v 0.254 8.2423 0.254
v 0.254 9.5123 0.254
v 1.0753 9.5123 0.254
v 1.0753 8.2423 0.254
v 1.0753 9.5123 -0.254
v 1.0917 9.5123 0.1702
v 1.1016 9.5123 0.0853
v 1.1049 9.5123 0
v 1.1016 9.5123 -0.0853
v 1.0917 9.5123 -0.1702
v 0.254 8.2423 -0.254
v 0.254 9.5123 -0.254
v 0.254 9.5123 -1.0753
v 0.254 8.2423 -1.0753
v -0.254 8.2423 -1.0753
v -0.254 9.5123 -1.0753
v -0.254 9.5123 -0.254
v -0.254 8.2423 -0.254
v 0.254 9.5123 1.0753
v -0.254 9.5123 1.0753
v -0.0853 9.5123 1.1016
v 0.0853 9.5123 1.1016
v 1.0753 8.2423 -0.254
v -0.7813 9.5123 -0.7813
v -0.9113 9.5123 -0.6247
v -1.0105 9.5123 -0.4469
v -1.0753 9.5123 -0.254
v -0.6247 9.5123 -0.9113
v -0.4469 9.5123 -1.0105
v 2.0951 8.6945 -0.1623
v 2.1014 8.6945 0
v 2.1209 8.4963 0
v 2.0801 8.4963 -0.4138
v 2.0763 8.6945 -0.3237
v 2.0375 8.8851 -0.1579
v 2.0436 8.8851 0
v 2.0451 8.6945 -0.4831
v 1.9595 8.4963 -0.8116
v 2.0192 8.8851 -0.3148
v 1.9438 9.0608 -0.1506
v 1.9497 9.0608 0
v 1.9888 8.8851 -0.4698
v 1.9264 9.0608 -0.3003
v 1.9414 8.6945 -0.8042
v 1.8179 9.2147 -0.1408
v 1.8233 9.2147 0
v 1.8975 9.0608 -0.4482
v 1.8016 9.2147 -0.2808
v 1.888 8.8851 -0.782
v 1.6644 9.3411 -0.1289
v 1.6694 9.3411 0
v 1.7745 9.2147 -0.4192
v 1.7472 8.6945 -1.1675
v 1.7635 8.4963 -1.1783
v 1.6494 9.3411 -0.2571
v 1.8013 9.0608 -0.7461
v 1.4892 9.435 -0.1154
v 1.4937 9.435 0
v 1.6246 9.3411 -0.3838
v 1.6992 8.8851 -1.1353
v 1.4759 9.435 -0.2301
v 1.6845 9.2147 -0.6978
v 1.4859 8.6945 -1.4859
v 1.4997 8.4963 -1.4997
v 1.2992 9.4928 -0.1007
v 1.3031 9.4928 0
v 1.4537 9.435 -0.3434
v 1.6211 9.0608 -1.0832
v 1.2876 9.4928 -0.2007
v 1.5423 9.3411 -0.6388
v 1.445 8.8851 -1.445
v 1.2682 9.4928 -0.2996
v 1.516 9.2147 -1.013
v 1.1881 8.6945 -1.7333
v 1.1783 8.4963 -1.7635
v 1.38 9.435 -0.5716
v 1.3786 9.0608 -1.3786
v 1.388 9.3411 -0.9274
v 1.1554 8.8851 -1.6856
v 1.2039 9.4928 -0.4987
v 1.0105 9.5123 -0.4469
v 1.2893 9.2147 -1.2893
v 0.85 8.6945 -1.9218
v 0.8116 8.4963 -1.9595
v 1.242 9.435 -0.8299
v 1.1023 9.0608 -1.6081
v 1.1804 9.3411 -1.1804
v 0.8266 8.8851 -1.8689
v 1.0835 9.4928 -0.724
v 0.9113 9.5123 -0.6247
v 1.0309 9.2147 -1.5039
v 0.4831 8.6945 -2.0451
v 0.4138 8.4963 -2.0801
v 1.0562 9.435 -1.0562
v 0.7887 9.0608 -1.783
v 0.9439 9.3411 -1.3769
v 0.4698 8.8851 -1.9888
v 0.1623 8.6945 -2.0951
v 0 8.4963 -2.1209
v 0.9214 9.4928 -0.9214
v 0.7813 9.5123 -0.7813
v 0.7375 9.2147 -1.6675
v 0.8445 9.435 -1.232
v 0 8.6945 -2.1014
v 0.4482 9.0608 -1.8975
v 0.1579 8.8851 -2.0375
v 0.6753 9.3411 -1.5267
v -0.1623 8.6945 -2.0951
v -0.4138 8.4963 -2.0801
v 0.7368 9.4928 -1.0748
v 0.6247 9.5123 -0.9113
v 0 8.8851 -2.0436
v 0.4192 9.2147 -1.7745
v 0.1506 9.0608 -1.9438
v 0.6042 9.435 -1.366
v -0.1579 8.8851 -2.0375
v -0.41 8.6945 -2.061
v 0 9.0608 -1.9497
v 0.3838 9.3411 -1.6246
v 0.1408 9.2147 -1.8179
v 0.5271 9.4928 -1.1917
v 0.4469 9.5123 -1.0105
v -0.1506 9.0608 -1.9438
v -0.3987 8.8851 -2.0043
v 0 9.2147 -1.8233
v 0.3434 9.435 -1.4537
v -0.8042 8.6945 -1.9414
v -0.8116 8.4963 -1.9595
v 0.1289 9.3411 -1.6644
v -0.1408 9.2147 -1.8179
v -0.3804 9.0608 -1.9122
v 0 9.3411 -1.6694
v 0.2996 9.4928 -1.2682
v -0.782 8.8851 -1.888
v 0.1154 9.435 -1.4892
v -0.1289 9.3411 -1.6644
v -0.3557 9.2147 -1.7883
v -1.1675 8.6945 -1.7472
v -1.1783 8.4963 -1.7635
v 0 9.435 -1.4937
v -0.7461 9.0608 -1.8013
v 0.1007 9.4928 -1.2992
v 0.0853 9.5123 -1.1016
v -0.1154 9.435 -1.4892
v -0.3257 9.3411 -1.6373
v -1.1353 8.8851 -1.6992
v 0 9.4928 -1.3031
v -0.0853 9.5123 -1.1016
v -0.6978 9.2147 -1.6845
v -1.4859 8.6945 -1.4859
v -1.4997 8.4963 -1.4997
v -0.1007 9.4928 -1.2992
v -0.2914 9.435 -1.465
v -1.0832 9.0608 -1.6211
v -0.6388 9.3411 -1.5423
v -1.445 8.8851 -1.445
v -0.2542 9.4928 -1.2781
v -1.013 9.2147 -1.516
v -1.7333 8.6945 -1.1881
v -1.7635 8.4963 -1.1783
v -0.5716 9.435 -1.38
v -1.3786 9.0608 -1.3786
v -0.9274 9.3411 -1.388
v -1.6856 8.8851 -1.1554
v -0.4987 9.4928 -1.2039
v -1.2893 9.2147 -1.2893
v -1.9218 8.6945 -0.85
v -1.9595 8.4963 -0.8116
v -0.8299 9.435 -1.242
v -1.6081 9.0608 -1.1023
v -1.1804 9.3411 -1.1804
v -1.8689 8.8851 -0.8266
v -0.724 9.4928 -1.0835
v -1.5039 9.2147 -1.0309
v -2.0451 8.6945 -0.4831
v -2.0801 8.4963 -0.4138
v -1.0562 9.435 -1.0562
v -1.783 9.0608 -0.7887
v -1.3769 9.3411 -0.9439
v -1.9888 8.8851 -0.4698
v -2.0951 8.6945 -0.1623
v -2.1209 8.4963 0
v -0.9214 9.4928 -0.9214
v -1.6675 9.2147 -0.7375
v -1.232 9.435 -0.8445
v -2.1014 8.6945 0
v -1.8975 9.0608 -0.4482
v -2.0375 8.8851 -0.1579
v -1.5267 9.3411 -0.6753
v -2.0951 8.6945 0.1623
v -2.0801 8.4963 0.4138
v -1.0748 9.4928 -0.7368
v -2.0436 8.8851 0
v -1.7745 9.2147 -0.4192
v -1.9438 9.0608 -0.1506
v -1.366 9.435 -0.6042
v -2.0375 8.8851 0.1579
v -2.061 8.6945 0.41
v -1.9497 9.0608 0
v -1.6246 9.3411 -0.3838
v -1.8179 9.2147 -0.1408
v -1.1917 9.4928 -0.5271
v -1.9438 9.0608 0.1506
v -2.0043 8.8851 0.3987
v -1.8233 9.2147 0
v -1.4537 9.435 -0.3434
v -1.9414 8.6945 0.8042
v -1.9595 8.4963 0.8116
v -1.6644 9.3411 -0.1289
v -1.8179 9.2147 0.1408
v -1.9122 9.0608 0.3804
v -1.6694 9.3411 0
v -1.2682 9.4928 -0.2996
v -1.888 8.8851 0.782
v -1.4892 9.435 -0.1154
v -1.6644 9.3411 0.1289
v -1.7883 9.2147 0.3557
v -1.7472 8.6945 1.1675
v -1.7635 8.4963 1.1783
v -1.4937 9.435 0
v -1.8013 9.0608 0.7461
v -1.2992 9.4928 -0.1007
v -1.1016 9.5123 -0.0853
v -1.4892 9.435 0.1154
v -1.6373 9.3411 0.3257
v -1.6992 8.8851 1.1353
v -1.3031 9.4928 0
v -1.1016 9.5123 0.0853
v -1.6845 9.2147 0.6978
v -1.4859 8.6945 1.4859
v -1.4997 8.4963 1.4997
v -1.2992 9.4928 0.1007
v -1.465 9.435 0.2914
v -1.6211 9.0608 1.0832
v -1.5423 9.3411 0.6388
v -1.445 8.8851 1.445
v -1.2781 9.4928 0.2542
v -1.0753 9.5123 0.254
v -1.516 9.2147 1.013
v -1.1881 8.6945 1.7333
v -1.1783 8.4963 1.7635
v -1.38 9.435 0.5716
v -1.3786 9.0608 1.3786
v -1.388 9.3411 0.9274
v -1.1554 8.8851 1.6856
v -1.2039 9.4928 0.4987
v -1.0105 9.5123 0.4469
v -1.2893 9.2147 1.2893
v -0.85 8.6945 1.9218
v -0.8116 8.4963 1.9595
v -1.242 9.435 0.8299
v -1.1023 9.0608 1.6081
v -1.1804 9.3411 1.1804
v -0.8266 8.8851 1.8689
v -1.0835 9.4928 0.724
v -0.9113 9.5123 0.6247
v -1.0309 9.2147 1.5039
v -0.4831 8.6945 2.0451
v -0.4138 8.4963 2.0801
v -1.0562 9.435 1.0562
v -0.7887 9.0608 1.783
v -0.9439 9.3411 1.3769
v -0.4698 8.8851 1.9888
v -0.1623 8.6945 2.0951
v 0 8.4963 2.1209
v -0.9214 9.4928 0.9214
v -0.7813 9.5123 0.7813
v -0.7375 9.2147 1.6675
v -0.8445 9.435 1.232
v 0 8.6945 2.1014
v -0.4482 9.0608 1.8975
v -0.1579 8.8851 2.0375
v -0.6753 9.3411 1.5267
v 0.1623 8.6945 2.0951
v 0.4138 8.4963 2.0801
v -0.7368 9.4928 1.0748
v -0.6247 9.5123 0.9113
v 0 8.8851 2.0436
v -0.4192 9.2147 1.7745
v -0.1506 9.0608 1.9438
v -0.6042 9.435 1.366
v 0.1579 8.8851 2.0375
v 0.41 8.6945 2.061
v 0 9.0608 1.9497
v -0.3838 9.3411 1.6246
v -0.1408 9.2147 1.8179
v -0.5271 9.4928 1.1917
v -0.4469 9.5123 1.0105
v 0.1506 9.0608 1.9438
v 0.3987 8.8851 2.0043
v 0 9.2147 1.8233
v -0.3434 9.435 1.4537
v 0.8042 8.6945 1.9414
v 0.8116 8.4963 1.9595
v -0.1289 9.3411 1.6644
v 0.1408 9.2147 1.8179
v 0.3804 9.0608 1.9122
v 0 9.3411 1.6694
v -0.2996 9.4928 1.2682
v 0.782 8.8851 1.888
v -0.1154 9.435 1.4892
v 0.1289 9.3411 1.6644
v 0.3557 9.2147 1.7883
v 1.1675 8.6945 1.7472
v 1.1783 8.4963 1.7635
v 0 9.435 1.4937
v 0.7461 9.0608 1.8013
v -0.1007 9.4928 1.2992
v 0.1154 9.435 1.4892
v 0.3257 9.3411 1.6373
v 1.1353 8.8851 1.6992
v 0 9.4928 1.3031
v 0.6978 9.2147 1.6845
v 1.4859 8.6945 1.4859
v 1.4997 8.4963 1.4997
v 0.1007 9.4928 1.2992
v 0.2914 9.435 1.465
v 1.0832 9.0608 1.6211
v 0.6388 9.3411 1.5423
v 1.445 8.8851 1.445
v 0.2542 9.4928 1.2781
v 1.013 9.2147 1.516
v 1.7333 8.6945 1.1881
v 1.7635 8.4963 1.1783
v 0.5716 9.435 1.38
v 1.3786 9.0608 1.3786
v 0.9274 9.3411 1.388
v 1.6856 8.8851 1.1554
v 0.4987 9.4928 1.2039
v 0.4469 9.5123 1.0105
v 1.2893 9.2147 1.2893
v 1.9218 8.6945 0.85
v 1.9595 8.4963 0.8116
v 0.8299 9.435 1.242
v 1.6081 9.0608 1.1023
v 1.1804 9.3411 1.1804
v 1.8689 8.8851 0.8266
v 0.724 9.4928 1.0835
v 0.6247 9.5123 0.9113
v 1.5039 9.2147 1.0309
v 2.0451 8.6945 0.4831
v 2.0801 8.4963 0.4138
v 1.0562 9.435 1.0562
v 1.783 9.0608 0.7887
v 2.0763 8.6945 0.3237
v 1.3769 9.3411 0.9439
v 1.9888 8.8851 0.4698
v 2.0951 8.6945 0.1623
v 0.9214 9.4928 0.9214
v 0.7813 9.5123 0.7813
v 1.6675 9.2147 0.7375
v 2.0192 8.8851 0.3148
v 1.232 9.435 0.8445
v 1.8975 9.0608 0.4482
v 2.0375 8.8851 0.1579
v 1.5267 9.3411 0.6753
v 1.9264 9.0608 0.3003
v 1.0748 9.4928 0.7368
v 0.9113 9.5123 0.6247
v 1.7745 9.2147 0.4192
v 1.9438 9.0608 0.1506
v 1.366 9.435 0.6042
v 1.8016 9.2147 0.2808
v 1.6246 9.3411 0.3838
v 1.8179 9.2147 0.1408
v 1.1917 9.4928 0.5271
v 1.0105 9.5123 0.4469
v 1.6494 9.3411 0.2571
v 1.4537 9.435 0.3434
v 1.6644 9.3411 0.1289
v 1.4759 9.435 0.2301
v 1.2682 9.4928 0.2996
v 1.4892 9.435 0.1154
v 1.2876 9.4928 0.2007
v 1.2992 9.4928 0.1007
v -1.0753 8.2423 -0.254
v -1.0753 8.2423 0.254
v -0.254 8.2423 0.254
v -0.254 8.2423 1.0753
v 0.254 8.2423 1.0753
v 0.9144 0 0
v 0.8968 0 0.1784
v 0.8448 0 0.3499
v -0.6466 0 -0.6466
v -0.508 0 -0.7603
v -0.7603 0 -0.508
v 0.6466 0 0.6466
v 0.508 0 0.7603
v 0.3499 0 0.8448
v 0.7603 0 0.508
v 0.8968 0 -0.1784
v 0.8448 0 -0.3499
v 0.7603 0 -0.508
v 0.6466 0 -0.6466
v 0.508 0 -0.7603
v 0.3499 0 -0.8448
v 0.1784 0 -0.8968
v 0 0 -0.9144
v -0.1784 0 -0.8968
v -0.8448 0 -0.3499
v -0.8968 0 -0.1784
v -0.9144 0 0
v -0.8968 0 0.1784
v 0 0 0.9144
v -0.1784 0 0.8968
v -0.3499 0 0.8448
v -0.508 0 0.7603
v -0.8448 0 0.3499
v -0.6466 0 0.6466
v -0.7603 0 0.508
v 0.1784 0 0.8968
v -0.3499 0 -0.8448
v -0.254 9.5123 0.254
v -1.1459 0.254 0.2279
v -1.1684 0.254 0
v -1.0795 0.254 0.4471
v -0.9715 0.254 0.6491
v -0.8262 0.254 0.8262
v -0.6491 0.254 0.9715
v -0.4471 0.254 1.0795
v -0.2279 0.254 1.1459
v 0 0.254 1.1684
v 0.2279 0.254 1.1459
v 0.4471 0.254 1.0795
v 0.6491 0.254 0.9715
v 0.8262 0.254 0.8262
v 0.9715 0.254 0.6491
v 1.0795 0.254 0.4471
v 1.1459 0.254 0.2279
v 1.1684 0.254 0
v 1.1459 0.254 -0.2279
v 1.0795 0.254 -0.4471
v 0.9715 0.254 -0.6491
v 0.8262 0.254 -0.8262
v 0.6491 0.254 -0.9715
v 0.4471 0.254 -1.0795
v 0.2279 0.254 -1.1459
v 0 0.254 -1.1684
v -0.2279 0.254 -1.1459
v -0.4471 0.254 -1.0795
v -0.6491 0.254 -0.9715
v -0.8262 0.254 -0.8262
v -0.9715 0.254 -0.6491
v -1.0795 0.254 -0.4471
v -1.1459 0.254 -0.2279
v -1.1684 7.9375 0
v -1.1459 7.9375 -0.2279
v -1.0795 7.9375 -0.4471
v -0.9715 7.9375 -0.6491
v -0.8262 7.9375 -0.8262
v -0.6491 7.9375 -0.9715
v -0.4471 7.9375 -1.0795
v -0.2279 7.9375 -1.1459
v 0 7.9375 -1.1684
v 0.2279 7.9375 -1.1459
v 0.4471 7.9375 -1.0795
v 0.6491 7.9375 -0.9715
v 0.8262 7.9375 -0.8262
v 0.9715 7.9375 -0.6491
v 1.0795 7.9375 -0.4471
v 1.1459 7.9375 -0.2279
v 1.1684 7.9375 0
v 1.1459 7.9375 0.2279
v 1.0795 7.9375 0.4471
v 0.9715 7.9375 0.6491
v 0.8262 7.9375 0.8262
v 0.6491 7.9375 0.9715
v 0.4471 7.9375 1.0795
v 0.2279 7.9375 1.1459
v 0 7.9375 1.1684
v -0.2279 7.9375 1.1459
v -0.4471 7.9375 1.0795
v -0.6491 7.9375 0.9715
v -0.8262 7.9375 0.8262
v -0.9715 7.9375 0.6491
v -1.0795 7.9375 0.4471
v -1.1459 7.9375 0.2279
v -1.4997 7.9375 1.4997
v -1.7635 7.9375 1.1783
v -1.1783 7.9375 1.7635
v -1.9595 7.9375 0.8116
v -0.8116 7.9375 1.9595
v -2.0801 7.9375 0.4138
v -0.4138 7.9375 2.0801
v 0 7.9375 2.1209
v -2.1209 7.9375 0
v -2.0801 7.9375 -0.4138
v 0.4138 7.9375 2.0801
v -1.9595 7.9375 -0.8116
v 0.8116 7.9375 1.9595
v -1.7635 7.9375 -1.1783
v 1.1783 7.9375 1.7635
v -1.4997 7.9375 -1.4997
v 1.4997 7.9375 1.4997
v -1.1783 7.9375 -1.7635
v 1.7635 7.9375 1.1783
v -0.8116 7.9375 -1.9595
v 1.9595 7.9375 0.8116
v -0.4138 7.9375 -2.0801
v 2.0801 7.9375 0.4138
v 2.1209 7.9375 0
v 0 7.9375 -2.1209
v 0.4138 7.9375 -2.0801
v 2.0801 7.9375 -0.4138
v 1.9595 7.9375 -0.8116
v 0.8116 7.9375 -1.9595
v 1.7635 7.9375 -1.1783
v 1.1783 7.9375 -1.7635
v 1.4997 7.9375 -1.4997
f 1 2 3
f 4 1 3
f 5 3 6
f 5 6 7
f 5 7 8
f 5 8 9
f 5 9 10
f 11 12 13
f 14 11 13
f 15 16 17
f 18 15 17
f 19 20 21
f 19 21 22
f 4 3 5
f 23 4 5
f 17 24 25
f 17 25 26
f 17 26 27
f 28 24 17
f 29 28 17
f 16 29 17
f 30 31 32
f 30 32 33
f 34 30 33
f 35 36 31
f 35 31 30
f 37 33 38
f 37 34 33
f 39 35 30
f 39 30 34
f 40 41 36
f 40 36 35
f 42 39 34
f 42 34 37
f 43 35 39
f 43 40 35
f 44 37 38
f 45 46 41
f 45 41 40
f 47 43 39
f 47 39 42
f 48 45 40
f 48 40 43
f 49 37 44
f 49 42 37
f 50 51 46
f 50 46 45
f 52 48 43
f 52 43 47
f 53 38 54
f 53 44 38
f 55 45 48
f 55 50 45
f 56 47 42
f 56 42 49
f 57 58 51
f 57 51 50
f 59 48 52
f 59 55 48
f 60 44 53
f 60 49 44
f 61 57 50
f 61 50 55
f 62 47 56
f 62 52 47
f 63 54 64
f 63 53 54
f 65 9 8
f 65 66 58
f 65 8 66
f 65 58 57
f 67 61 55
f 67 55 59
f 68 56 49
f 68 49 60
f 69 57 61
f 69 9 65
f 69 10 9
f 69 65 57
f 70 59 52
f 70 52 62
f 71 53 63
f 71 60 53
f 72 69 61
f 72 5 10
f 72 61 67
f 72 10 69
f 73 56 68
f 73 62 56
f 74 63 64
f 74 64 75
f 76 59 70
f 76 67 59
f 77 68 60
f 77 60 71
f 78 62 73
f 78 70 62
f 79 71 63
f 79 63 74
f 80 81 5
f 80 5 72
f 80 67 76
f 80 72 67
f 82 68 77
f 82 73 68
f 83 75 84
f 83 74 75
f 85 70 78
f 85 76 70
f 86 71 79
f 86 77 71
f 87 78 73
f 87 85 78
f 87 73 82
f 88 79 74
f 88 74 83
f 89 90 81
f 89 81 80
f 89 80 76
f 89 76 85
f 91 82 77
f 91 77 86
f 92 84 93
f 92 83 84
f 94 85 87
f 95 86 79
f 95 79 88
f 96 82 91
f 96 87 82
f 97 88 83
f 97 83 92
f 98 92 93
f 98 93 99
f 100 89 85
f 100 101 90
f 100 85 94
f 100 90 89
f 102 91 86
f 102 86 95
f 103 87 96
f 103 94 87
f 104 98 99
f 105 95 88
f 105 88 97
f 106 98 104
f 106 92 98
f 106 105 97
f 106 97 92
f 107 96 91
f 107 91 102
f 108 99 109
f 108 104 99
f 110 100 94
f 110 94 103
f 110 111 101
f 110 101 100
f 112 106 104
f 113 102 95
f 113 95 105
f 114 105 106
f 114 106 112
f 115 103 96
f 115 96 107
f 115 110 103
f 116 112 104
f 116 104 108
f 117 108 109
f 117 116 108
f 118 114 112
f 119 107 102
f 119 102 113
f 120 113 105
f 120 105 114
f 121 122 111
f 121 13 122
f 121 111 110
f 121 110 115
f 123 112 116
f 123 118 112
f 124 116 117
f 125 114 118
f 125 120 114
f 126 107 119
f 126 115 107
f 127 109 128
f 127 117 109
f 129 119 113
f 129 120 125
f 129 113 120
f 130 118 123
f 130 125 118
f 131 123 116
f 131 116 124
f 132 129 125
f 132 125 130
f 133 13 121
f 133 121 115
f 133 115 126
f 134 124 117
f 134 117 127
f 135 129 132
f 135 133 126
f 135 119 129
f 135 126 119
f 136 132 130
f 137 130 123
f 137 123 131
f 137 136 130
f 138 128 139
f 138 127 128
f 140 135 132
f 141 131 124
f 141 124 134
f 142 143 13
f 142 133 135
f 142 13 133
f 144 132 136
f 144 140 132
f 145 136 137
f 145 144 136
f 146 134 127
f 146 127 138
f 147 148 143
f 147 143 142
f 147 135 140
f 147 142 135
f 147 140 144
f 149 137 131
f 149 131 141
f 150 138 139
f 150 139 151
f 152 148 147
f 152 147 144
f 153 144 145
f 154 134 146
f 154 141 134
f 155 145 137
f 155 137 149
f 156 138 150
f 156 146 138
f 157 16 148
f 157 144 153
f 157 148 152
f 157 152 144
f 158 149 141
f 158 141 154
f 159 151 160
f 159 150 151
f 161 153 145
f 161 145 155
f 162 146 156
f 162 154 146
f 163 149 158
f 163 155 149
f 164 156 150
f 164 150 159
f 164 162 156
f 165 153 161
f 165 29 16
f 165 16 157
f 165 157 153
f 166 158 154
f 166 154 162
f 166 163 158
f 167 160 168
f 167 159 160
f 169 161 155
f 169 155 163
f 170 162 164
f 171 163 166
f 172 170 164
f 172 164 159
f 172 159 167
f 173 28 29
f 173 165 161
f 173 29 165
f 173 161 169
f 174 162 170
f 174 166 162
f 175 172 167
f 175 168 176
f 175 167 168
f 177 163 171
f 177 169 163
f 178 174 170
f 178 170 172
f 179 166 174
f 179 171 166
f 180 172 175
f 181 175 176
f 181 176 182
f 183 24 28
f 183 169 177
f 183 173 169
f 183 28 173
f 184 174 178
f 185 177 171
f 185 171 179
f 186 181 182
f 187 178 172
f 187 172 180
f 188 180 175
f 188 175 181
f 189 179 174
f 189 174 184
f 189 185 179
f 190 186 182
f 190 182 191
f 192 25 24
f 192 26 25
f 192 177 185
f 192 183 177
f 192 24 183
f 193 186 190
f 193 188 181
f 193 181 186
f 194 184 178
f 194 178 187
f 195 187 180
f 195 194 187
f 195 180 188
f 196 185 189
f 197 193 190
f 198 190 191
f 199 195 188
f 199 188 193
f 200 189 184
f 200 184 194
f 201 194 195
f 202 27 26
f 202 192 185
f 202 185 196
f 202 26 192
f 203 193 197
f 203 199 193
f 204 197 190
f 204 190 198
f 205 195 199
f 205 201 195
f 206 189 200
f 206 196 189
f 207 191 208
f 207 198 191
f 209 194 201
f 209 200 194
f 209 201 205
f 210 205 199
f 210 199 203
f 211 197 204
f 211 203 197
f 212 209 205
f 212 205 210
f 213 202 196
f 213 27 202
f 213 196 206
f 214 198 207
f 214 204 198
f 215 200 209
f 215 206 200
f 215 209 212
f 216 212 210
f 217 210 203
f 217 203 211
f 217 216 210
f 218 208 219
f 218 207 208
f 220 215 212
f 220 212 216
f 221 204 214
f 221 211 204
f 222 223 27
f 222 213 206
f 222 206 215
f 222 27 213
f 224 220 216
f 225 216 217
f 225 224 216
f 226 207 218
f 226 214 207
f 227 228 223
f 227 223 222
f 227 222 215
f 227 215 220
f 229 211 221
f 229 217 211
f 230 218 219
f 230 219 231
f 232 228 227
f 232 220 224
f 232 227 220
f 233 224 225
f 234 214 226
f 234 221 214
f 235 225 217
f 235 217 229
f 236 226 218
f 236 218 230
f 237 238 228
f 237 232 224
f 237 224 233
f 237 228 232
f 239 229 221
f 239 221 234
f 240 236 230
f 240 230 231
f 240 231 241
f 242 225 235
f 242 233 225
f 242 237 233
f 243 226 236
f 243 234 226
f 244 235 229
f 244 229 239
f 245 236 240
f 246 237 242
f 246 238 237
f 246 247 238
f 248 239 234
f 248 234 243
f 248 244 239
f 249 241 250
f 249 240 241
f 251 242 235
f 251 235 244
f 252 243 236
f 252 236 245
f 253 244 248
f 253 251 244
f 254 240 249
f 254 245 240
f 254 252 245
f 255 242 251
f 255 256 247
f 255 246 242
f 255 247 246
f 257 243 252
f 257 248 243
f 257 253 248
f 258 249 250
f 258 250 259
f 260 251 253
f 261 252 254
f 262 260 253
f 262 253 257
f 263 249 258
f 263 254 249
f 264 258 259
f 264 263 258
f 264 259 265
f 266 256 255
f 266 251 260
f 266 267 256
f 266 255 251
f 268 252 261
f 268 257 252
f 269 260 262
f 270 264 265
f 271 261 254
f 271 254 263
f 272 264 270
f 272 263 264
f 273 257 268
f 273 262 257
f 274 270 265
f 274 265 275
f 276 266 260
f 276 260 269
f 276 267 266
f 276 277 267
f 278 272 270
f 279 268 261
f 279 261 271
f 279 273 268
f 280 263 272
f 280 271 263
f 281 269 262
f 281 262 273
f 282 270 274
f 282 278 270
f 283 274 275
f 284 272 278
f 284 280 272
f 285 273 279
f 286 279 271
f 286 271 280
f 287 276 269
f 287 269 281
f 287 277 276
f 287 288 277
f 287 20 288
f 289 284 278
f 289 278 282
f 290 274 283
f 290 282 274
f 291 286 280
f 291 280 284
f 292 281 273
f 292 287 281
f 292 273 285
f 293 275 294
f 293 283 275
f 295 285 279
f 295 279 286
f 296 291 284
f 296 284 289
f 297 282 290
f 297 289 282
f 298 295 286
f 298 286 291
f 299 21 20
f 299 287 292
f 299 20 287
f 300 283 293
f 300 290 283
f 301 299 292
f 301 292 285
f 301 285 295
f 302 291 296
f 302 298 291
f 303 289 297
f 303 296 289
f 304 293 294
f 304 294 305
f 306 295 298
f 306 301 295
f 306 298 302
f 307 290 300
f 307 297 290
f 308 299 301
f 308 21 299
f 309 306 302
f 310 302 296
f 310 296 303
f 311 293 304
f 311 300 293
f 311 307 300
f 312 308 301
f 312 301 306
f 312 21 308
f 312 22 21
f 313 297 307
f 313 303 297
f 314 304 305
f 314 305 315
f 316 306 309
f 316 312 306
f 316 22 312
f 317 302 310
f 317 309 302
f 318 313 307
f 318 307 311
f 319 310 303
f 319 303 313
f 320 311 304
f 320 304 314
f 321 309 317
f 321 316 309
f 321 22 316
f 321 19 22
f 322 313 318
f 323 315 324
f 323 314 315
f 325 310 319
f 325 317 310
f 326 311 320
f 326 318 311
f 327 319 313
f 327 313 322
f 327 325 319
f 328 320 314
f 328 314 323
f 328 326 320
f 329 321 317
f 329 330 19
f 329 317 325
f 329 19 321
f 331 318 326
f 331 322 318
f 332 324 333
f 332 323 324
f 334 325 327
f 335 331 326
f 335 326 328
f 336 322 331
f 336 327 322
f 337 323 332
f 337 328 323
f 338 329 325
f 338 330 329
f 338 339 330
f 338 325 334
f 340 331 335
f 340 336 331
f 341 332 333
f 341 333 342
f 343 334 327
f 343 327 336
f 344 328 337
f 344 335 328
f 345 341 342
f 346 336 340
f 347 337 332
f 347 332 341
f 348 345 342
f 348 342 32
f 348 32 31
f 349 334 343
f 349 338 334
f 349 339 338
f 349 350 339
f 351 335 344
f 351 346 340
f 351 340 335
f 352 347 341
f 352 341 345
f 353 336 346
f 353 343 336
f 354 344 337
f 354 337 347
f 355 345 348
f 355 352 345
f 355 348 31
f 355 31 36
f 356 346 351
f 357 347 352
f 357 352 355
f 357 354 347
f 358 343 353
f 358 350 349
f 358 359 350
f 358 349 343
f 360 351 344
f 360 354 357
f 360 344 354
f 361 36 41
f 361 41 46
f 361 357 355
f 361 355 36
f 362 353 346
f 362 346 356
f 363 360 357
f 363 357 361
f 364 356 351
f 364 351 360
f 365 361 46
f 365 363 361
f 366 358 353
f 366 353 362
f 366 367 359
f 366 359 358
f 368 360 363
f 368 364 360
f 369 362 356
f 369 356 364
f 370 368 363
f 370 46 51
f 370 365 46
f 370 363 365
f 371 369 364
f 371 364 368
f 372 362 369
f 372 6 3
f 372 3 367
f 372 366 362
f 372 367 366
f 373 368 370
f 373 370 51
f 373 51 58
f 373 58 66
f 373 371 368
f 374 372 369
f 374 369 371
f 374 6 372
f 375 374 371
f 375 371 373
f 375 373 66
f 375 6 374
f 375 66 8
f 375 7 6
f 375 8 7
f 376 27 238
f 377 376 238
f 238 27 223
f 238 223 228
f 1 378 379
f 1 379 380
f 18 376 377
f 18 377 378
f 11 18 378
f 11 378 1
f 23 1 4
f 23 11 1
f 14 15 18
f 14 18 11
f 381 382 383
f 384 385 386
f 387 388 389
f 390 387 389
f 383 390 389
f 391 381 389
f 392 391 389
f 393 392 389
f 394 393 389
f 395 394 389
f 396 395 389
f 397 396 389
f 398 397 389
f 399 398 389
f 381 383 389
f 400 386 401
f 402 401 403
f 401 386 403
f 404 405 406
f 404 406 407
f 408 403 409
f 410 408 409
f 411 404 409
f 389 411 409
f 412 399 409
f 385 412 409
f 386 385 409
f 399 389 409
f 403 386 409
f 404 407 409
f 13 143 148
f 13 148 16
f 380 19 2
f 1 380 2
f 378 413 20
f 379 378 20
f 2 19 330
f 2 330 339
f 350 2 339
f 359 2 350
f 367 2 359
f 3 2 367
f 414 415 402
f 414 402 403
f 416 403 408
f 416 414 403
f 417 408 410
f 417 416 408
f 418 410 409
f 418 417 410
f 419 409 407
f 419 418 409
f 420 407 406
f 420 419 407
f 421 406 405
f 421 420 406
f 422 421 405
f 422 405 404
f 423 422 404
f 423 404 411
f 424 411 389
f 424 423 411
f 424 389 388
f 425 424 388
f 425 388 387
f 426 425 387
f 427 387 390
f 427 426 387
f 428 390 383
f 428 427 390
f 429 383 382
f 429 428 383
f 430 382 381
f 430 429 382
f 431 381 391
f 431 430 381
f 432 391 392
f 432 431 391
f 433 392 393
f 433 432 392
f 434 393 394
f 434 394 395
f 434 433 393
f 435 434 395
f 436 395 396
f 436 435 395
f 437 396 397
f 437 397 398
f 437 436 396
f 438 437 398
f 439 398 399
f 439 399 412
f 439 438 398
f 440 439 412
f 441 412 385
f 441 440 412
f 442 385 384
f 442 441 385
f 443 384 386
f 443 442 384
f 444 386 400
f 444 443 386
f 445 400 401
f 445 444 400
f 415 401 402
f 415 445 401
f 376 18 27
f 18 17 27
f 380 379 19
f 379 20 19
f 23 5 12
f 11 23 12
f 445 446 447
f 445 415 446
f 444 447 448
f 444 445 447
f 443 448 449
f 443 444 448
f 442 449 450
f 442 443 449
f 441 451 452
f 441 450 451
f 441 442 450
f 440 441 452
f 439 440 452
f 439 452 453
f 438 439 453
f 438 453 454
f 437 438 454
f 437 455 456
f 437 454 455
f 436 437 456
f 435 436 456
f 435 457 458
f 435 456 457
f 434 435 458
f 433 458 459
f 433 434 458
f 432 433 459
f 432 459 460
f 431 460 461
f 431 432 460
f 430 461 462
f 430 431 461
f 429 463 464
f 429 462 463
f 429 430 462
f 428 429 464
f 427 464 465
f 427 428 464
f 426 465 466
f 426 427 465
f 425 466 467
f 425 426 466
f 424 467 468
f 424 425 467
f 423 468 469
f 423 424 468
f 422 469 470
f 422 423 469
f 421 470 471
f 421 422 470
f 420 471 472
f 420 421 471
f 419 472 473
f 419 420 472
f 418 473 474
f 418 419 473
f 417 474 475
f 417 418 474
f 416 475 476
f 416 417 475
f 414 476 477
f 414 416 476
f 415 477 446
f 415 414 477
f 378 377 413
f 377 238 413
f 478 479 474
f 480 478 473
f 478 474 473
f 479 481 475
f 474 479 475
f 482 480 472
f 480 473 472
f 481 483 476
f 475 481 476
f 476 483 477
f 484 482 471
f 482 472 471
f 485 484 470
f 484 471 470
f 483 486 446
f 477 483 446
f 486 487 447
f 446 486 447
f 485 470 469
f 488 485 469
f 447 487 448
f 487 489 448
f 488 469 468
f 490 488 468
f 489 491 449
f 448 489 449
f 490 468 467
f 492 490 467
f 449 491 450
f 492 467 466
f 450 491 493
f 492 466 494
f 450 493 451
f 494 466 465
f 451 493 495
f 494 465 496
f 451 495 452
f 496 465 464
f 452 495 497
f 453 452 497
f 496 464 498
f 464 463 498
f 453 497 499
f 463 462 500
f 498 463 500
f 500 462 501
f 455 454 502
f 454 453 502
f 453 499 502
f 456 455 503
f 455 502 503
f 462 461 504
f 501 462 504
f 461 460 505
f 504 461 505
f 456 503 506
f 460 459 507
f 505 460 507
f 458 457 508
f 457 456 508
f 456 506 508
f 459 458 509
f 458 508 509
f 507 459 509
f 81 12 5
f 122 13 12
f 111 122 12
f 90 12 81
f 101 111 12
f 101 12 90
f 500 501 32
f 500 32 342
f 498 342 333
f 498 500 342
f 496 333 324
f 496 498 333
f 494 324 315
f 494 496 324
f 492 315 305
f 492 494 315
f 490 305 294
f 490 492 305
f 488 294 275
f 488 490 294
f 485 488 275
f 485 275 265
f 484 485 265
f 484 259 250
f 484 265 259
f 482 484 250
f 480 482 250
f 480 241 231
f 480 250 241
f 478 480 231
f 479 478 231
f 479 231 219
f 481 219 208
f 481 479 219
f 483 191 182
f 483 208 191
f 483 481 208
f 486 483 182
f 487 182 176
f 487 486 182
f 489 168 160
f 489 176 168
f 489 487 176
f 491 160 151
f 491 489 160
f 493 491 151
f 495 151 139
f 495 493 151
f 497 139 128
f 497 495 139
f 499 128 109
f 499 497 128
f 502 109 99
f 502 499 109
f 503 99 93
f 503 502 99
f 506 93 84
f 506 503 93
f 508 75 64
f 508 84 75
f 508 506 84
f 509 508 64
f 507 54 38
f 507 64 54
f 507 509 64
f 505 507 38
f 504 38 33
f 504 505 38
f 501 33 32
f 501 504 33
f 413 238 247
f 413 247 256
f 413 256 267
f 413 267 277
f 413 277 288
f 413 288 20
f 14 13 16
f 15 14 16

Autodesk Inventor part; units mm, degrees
ref_plane "YZ Plane" through (0, 0, 0) normal (1, 0, 0) x (0, 1, 0)
ref_plane "XZ Plane" through (0, 0, 0) normal (0, 1, 0) x (-1, 0, 0)
ref_plane "XY Plane" through (0, 0, 0) normal (0, 0, 1) x (1, 0, 0)
sketch "Sketch1" plane through (0, 0, 0) normal (0, 1, 0) x (-1, 0, 0)
  circle A0 centre (0, 0) radius 1.1684
  dimension "d0" = 2.3368
extrude "Extrusion1" add sketch "Sketch1" along normal blind 7.9375
sketch "Sketch2" plane through (0, 7.9375, 0) normal (0, 1, 0) x (1, 0, 0)
  circle A0 centre (0, 0) radius 1.1684 projected
  circle A1 centre (0, 0) radius 2.1209
  dimension "d3" = 4.2418
extrude "Extrusion2" add sketch "Sketch2" along normal blind 1.5748 contours A0 | A1
fillet "Fillet1" radius 1.016 1 edges at (-2.1209, 9.5123, 0)
thread "Thread1" size "3-28" class "2B" standard "Inch Tapping Threads" full length
chamfer "Chamfer1" distance 0.254 angle 45 1 edges at (1.1684, 0, 0)
sketch "Sketch3" plane through (0, 9.5123, 0) normal (0, 1, 0) x (1, 0, 0)
  circle A0 centre (0, 0) radius 1.1049 projected
  line L0 (-0.254, -1.0753) -> (0.254, -1.0753)
  line L1 (0.254, -1.0753) -> (0.254, 1.0753)
  line L2 (0.254, 1.0753) -> (-0.254, 1.0753)
  line L3 (-0.254, 1.0753) -> (-0.254, -1.0753)
  line L4 (-1.0753, -0.254) -> (1.0753, -0.254)
  line L5 (1.0753, -0.254) -> (1.0753, 0.254)
  line L6 (1.0753, 0.254) -> (-1.0753, 0.254)
  line L7 (-1.0753, 0.254) -> (-1.0753, -0.254)
  point P0 (0, 1.0753)
  point P1 (1.0753, 0)
  dimension "d12" = 0.508
extrude "Extrusion3" cut sketch "Sketch3" against normal blind 1.27 contours L5 L4 L1 L6 | L1 L6 L3 L2 | L1 L4 L3 L6 | L0 L3 L4 L1 | L3 L4 L7 L6
properties part number "Screw"
